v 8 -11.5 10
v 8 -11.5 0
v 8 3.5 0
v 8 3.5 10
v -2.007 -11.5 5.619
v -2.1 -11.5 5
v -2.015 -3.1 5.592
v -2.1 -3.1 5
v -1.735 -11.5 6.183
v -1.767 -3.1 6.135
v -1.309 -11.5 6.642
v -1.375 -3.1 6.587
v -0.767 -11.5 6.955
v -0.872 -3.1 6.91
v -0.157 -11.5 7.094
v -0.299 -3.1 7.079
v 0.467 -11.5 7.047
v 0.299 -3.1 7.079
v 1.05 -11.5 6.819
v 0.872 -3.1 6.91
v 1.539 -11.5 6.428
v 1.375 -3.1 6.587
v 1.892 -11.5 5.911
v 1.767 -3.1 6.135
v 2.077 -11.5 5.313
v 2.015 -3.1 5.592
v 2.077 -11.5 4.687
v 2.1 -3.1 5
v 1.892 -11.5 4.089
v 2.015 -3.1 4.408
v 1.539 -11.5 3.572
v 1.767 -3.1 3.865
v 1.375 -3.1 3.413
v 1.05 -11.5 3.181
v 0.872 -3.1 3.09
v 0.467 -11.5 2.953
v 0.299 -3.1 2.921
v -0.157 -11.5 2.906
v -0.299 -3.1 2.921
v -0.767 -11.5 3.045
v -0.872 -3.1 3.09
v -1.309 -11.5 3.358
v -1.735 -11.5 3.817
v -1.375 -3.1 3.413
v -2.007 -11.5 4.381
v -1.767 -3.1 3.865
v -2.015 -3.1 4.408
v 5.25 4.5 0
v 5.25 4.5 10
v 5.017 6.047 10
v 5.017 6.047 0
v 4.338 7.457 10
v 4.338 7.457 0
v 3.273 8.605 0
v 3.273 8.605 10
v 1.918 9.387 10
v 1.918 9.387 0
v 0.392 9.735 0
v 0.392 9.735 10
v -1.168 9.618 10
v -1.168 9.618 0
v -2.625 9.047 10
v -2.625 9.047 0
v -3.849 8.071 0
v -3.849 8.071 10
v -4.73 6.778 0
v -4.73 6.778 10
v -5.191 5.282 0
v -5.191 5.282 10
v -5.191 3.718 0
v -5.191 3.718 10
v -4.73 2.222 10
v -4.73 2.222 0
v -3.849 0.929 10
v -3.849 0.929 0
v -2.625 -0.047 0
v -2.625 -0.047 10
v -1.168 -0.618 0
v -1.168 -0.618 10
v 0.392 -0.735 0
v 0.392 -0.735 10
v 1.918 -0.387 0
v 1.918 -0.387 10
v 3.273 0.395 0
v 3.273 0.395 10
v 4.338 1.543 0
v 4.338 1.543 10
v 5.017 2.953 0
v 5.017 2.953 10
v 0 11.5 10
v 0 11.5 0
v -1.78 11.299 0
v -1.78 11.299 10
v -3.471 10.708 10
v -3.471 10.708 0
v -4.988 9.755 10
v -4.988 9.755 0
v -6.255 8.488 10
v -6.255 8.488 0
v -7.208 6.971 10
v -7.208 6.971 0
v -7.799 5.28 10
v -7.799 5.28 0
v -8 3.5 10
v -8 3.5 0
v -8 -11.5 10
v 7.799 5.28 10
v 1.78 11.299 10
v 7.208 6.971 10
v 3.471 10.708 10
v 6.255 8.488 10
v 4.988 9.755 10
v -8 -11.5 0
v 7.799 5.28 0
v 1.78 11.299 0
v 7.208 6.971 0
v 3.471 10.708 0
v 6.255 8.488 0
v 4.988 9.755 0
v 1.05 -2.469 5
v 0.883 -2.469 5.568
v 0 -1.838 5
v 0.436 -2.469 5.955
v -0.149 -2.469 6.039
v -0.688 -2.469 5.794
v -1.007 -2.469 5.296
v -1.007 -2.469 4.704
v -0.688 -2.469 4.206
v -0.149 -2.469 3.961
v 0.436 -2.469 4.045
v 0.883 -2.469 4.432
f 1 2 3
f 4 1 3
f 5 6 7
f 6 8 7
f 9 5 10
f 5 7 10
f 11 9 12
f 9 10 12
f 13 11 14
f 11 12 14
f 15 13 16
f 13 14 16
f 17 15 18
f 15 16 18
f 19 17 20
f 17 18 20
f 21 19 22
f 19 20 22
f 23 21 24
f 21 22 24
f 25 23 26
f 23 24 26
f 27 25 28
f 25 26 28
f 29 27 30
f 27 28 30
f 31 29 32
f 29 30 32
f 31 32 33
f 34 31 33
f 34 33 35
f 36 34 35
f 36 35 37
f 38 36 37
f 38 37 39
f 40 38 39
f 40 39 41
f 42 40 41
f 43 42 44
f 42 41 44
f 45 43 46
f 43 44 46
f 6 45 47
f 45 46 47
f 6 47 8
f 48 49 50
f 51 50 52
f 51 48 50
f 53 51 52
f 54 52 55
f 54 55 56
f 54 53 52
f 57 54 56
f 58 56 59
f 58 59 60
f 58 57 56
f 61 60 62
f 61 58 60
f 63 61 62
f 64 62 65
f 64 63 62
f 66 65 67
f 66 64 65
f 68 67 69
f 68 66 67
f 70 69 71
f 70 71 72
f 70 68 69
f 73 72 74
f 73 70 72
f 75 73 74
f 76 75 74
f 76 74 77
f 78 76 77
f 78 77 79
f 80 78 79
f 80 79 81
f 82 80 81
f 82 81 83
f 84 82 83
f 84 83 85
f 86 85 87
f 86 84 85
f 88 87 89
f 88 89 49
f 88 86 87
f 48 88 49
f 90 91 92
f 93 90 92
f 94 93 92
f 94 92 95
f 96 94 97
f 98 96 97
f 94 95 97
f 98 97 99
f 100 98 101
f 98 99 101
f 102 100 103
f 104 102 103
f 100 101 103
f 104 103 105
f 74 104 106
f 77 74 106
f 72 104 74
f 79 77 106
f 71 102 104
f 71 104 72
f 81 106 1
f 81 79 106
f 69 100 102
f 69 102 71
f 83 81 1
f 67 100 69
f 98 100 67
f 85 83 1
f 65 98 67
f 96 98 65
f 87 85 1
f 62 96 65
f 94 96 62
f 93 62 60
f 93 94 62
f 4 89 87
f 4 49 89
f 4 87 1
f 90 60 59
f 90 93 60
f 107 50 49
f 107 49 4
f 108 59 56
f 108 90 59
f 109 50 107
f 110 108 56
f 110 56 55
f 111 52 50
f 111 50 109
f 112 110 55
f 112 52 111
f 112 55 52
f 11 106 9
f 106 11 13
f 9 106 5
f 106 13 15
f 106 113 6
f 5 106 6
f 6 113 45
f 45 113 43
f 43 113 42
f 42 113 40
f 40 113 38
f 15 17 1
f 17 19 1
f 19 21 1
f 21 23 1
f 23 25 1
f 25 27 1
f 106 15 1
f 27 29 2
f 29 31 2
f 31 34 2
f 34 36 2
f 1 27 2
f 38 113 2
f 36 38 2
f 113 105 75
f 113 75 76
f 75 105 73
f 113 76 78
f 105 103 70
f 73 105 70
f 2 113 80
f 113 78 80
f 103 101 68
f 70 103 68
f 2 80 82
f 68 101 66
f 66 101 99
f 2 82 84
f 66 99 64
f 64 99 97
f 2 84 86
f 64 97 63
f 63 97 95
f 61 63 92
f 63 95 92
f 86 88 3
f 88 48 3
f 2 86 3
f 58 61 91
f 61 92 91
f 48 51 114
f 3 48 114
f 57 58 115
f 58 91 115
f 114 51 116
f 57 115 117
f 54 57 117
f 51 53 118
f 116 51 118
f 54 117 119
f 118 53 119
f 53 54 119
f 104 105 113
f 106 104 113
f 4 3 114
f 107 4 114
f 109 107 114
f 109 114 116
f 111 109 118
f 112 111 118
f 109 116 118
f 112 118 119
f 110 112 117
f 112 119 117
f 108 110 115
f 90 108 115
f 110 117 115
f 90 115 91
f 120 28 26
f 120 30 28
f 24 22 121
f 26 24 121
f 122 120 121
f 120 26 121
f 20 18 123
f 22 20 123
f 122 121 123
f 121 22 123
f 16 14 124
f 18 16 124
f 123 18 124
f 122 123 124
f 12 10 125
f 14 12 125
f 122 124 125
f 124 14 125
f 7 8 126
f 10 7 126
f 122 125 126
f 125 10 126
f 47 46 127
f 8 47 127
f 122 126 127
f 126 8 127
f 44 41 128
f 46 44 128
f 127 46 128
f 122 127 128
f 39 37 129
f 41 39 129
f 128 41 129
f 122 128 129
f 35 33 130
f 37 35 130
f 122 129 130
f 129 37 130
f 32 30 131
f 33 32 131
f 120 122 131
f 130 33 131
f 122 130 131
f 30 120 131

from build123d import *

# Parameters (mm, degrees)
F0_R     = 5.25
F1_DEPTH = 10
F3_D     = 4.2
F3_DEPTH = 8.4
F3_TIP   = 1.2618073


with BuildPart() as f1:
    # F0 (on Top) → F1 (new body)
    with BuildSketch(Plane.XY):
        with BuildLine():
            Line((-8, -11.5), (8, -11.5))
            Line((8, -11.5), (8, 3.5))
            ThreePointArc((8, 3.5), (5.6568542495, 9.1568542495), (0, 11.5))
            ThreePointArc((0, 11.5), (-5.6568542495, 9.1568542495), (-8, 3.5))
            Line((-8, 3.5), (-8, -11.5))
        make_face()
        with Locations((0, 4.5)):
            Circle(F0_R, mode=Mode.SUBTRACT)
    extrude(amount=F1_DEPTH)

    # F3
    with Locations(Plane.XZ.offset(11.5)):
        with Locations((0, 5)):
            Hole(F3_D / 2, depth=F3_DEPTH)
            with Locations((0, 0, -(F3_DEPTH + F3_TIP / 2))):  # 118° drill point
                Cone(0, F3_D / 2, F3_TIP, mode=Mode.SUBTRACT)


solid = f1.part
